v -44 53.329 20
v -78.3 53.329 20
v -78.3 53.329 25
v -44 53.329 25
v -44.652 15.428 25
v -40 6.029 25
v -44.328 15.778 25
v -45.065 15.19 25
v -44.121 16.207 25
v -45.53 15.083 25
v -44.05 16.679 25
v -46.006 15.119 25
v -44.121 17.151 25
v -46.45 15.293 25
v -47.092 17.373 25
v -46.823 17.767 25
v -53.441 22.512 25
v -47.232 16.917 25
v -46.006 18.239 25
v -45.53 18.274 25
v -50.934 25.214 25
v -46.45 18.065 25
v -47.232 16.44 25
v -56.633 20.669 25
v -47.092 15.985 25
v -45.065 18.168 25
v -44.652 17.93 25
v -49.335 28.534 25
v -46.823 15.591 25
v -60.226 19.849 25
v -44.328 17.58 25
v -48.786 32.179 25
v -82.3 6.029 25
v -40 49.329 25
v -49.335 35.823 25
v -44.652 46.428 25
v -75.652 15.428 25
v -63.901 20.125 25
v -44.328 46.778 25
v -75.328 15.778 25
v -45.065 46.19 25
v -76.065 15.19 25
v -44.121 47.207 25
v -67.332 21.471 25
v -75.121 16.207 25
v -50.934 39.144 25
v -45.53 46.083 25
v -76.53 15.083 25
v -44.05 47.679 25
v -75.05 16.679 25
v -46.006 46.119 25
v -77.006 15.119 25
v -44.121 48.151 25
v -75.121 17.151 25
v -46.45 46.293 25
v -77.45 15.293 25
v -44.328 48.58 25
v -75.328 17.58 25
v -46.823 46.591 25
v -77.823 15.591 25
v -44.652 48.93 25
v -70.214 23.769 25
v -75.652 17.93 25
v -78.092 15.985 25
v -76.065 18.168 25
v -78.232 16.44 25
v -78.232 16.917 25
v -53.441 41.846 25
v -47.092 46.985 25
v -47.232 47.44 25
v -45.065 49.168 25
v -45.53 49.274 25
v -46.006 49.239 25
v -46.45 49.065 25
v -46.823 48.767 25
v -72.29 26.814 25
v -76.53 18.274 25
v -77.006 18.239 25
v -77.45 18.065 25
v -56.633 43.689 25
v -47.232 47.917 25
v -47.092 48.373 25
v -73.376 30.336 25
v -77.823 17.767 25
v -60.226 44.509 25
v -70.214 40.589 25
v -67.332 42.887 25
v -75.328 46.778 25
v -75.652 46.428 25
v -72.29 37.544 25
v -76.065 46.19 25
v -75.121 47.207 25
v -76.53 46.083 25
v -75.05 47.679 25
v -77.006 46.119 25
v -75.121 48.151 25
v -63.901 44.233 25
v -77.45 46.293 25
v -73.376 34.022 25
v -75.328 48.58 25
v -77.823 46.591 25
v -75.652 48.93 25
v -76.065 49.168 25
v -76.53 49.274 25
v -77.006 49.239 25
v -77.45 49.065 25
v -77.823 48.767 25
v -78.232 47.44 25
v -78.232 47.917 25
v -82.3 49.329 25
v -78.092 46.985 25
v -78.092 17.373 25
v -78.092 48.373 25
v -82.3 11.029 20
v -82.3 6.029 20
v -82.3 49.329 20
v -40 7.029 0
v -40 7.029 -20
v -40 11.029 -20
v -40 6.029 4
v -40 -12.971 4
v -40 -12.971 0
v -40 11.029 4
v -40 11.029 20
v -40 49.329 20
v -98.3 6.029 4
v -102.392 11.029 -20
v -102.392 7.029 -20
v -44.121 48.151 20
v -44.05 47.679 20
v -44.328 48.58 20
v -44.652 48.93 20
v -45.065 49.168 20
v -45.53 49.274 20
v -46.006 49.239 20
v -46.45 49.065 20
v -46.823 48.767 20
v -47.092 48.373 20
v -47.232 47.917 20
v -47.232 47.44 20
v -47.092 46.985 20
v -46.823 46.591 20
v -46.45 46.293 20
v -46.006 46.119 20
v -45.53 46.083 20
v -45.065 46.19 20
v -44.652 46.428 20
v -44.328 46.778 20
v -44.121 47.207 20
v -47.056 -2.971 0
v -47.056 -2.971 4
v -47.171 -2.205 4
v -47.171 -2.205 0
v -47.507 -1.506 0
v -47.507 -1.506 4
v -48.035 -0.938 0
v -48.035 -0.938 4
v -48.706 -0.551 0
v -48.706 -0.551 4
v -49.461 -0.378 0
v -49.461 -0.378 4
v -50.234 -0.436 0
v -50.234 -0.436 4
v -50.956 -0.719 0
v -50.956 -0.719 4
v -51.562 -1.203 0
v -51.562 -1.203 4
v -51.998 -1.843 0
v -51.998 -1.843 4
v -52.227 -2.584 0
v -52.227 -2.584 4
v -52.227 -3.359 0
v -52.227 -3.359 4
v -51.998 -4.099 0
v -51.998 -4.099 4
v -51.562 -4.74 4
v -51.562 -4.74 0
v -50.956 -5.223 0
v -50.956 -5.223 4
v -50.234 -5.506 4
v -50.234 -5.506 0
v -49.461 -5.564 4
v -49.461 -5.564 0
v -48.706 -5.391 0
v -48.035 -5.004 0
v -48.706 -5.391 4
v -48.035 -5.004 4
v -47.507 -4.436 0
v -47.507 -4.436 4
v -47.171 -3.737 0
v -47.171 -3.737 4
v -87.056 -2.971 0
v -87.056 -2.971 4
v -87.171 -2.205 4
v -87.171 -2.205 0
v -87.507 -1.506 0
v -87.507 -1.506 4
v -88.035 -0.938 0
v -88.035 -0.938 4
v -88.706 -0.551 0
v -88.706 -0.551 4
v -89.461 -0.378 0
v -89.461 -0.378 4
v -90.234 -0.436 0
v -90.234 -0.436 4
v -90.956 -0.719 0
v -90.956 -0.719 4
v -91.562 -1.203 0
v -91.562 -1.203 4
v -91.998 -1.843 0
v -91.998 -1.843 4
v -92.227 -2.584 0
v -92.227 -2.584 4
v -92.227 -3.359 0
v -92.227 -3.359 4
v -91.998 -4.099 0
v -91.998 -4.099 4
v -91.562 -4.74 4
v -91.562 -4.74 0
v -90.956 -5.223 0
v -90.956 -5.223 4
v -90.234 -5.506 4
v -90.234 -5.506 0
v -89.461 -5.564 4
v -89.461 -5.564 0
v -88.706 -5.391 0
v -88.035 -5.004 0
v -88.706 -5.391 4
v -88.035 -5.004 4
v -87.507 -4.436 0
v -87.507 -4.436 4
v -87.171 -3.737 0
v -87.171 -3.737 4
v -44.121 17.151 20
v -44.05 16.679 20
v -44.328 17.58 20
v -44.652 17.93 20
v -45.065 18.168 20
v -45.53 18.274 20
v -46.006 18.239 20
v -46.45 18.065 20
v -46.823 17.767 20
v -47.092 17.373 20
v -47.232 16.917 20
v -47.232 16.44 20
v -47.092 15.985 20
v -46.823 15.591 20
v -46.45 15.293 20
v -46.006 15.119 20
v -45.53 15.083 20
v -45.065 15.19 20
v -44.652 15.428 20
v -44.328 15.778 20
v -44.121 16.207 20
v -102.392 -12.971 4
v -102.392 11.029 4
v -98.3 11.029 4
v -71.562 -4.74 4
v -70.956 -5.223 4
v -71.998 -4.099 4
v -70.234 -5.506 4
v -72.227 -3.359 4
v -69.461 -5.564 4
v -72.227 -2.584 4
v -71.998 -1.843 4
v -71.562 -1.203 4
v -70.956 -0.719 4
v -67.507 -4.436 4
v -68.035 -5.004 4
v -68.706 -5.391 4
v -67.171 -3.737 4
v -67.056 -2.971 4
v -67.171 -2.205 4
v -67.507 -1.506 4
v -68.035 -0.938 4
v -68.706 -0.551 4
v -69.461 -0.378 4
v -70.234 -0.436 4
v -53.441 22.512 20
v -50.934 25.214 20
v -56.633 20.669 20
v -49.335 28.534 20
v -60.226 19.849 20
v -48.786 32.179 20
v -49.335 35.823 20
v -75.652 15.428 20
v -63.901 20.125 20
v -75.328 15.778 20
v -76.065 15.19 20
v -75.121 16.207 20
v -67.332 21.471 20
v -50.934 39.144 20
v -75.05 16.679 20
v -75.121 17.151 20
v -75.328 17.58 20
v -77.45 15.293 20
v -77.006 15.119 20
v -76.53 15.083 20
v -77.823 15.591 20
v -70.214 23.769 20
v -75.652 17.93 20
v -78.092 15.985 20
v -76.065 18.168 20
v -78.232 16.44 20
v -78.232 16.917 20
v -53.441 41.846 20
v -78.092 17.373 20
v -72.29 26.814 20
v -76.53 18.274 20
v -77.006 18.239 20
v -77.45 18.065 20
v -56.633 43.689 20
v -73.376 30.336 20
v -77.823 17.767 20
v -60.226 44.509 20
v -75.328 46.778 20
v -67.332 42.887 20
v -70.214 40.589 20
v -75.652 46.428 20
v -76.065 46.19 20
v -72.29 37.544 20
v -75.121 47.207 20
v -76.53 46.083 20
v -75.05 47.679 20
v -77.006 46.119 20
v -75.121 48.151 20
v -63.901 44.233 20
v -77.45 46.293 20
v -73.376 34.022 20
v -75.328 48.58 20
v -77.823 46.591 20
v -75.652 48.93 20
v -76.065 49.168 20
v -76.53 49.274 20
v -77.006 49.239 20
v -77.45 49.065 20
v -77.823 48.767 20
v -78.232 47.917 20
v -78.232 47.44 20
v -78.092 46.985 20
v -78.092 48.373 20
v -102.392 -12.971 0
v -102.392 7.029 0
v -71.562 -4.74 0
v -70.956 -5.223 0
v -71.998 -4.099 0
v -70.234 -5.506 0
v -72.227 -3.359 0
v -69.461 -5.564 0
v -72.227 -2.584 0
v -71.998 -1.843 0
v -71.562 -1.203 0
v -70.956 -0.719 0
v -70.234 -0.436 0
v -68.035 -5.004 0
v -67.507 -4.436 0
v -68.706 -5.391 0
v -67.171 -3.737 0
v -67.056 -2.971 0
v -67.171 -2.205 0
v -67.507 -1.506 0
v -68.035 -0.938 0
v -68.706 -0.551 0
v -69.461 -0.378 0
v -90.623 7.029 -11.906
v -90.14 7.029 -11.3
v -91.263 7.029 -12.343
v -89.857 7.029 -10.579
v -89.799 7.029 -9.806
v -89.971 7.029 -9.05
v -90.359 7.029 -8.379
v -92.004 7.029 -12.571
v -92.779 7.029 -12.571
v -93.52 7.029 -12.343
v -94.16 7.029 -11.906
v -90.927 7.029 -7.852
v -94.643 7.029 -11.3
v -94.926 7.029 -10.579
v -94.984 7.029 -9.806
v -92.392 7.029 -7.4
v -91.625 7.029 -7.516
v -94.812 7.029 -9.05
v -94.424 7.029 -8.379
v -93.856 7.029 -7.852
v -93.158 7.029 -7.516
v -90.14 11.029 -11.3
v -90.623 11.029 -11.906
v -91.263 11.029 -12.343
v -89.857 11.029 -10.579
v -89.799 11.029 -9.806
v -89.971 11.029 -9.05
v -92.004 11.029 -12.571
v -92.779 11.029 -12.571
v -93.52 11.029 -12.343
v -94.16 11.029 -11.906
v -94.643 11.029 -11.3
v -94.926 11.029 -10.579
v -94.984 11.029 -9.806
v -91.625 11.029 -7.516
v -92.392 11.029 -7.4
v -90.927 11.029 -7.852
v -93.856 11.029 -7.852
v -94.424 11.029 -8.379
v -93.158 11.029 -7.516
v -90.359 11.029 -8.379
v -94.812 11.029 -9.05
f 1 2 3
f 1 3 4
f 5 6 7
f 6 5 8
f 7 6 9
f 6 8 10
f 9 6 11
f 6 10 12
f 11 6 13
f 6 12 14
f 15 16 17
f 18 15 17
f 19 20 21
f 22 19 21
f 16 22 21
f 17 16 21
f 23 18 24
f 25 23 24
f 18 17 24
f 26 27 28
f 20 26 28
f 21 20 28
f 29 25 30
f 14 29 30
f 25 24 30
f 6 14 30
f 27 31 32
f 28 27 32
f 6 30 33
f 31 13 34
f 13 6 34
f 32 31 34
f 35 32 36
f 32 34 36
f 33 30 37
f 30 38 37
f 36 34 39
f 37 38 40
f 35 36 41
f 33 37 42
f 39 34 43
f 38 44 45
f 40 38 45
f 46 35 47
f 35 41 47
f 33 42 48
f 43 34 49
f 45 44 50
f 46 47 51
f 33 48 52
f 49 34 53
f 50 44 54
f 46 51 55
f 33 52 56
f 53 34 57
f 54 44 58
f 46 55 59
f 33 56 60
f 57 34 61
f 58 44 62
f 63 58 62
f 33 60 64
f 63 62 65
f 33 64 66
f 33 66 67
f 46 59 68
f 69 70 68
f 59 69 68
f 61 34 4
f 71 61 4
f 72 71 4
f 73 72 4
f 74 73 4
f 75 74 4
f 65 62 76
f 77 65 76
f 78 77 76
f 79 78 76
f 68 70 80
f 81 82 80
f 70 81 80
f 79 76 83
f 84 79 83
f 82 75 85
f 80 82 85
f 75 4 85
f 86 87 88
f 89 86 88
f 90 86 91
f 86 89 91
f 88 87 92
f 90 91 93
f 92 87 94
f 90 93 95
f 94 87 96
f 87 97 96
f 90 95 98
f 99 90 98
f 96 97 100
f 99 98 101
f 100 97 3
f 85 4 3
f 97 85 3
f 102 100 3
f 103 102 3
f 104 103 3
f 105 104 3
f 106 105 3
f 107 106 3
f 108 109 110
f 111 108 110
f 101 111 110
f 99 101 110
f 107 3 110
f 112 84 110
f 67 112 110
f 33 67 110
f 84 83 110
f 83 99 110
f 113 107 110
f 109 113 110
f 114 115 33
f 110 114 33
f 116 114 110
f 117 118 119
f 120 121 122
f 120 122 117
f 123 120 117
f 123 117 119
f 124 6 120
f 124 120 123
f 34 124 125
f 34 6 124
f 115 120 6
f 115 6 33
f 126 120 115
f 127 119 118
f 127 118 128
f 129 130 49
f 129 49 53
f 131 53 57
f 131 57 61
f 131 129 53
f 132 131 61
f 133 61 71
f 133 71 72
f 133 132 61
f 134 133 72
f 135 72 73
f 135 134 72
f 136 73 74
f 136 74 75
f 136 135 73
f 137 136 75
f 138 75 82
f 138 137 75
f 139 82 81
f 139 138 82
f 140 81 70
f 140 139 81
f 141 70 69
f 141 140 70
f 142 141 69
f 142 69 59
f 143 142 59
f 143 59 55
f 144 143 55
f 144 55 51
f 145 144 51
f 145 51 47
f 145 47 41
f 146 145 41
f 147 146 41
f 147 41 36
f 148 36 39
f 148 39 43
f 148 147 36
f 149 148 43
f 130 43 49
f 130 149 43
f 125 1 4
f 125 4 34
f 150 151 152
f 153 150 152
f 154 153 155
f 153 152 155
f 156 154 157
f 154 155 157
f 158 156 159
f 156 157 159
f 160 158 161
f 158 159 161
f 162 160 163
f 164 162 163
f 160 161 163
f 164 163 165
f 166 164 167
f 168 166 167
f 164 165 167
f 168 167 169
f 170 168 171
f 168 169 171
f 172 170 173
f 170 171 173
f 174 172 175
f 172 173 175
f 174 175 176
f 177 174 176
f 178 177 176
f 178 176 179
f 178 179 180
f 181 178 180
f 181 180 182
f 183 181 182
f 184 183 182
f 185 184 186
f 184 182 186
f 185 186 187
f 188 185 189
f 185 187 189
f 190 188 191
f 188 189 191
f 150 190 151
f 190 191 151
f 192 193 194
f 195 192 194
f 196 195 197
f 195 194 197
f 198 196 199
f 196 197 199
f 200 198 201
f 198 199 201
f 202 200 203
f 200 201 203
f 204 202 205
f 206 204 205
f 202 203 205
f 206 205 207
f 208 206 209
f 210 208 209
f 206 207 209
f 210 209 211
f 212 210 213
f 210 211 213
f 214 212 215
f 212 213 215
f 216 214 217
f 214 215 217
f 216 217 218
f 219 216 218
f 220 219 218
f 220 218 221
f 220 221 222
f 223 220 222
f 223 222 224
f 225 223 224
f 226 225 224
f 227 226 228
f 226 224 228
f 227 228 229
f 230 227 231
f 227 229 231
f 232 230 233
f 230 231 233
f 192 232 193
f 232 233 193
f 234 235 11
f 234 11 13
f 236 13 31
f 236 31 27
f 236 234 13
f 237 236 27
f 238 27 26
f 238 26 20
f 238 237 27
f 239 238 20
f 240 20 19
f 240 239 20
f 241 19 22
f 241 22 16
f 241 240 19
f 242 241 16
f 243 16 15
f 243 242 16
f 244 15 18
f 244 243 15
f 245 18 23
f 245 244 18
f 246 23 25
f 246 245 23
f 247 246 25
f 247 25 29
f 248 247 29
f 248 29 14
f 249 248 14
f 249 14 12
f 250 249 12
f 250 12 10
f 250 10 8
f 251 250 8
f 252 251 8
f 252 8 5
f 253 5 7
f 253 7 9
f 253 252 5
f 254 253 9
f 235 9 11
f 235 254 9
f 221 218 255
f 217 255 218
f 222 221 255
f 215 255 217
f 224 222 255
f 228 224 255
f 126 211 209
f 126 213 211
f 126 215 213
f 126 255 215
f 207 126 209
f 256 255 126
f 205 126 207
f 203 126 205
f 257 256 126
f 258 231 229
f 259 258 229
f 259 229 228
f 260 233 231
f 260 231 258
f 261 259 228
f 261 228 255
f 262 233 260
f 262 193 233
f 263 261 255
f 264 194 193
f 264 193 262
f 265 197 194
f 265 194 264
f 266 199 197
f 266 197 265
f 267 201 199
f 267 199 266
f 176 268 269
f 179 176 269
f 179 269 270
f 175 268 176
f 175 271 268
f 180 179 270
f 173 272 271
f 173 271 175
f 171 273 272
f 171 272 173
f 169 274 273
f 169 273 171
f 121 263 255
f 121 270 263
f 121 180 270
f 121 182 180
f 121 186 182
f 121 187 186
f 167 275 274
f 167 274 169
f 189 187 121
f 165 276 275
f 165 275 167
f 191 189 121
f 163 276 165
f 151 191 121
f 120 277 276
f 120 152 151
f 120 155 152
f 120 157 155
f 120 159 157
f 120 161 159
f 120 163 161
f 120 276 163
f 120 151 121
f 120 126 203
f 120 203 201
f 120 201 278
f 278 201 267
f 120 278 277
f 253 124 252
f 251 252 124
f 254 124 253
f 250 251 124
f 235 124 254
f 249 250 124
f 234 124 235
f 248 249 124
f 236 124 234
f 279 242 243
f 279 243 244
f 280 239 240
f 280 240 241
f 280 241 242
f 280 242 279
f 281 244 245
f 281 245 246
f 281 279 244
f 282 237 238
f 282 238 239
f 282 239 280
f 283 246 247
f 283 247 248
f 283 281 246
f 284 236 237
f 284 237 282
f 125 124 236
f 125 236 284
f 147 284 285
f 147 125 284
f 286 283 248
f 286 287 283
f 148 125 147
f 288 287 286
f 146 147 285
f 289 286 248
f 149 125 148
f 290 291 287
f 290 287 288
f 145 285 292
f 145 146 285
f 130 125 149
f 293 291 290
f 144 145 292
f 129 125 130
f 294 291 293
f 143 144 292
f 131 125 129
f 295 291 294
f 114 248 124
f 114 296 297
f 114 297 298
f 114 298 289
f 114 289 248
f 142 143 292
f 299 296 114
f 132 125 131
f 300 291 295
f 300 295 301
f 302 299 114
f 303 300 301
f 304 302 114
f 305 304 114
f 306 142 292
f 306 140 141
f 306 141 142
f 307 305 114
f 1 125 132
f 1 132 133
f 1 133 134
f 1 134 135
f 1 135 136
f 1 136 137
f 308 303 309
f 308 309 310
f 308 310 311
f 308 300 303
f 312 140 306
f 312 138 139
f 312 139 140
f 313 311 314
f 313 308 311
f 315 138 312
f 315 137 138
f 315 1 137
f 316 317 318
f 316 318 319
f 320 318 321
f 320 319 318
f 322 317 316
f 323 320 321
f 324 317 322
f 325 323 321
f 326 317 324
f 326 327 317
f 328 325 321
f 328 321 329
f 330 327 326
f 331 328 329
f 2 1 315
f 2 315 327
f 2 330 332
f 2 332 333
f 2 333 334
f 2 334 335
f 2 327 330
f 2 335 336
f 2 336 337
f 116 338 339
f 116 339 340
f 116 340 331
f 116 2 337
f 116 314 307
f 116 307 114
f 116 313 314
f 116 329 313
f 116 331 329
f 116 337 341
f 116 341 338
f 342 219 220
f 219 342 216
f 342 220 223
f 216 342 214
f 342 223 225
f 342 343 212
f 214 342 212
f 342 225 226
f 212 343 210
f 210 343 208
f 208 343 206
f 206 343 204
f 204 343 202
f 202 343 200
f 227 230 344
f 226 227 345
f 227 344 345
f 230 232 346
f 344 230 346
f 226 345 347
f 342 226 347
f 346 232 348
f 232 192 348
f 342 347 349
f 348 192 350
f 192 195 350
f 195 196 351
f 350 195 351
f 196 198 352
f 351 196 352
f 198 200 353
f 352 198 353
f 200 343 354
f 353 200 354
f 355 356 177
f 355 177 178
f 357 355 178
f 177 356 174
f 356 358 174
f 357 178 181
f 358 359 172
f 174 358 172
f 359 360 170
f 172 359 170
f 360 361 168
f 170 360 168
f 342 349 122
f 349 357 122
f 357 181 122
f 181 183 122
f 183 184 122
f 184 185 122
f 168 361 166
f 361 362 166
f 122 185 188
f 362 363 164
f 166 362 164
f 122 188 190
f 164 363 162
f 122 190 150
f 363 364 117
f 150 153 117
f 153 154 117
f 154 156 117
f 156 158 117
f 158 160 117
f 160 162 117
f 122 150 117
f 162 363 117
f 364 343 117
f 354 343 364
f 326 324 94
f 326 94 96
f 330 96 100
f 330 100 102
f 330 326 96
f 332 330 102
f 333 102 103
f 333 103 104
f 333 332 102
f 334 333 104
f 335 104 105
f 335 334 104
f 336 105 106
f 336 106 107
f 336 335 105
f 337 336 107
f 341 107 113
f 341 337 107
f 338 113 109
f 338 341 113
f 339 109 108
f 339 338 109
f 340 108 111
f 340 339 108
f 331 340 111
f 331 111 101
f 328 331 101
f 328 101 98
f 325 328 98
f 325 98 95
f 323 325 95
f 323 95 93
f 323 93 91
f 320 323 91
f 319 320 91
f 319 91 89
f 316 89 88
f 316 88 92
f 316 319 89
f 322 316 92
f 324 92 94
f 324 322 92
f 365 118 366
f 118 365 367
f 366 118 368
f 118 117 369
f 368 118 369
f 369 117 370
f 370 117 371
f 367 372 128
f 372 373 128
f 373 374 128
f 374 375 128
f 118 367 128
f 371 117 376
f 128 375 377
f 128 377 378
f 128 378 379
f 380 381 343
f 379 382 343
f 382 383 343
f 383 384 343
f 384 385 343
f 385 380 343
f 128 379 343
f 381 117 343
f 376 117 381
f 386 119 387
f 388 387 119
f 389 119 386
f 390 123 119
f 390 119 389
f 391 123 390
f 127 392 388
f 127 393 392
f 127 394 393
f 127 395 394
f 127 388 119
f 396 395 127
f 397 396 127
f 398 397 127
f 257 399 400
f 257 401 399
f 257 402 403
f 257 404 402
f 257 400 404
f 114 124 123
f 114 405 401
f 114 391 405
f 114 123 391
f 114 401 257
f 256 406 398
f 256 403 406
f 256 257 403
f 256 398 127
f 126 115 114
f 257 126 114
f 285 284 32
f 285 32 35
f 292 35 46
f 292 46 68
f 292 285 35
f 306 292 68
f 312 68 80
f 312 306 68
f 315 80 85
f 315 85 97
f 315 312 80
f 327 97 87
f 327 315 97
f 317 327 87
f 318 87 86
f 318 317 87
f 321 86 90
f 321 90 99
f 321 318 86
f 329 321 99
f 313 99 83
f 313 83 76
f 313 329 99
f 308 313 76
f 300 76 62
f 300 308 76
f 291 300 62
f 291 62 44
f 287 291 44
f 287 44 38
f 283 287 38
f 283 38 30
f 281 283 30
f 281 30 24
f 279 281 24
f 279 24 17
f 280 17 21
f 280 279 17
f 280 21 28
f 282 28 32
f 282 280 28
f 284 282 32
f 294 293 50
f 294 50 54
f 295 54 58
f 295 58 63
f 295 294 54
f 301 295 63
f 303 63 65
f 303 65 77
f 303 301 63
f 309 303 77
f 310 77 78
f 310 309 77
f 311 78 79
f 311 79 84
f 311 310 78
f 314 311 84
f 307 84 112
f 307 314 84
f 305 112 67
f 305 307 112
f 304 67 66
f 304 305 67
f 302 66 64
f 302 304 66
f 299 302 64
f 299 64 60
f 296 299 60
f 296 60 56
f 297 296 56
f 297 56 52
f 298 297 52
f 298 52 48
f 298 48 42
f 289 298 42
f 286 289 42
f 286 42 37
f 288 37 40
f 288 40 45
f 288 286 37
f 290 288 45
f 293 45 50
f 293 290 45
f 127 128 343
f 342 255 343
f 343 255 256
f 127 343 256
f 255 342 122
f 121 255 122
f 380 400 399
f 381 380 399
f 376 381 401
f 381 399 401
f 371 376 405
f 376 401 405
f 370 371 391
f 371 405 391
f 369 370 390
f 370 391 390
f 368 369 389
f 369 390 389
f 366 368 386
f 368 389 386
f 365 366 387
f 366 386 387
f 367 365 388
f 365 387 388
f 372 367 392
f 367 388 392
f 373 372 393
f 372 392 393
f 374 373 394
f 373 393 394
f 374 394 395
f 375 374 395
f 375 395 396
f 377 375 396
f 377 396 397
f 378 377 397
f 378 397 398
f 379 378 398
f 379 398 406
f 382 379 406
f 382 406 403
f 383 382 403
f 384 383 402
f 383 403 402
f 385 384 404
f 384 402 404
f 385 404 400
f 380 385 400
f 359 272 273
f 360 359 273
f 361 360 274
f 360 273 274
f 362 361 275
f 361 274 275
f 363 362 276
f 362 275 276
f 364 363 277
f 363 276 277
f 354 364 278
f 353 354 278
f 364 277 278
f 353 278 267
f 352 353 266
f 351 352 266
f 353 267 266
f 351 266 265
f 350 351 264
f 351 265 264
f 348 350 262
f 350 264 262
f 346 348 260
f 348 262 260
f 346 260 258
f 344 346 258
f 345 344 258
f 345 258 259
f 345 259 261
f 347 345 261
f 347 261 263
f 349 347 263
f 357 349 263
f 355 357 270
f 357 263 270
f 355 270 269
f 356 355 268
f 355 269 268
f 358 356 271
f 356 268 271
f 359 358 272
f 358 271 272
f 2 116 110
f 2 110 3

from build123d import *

# Parameters (mm, degrees)
SKICA1_W                 = 62.391596743
SKICA1_H                 = 24
P_IDAT_VYSUNUT_M1_DEPTH  = 4
SKICA2_W                 = 42.3
SKICA2_H                 = 5
P_IDAT_VYSUNUT_M2_DEPTH  = 16
SKICA3_R                 = 1.6
SKICA3_R_2               = 12.36434098
P_IDAT_VYSUNUT_M5_DEPTH  = 5
ZKOSEN_1_SIZE            = 16
SKICA4_R                 = 2.6
ODEBRAT_VYSUNUT_M1_DEPTH = 4
SKICA5_W                 = 62.391596743
SKICA5_H                 = 4
P_IDAT_VYSUNUT_M6_DEPTH  = 20
SKICA6_R                 = 2.6
ODEBRAT_VYSUNUT_M2_DEPTH = 4


with BuildPart() as part:
    # Skica1 → Přidat vysunutím1 (new body)
    with BuildSketch(Plane.XY):
        with Locations((-71.195798372, -0.971059771)):
            Rectangle(SKICA1_W, SKICA1_H)
    extrude(amount=P_IDAT_VYSUNUT_M1_DEPTH)

    # Skica2 → Přidat vysunutím2 (add)
    with BuildSketch(Plane.XY.offset(4)):
        with Locations((-61.15, 8.528940229)):
            Rectangle(SKICA2_W, SKICA2_H)
    extrude(amount=P_IDAT_VYSUNUT_M2_DEPTH)

    # Skica3 → Přidat vysunutím5 (add)
    with BuildSketch(Plane.XY.offset(20)):
        Polygon((-40, 6.028940229), (-82.3, 6.028940229), (-82.3, 49.328940229), (-78.3, 53.328940229), (-44, 53.328940229), (-40, 49.328940229), align=None)
        with Locations((-45.65, 47.678940229)):
            Circle(SKICA3_R, mode=Mode.SUBTRACT)
        with Locations((-76.65, 47.678940229)):
            Circle(SKICA3_R, mode=Mode.SUBTRACT)
        with Locations((-76.65, 16.678940229)):
            Circle(SKICA3_R, mode=Mode.SUBTRACT)
        with Locations((-45.65, 16.678940229)):
            Circle(SKICA3_R, mode=Mode.SUBTRACT)
        with Locations((-61.15, 32.178940229)):
            Circle(SKICA3_R_2, mode=Mode.SUBTRACT)
    extrude(amount=P_IDAT_VYSUNUT_M5_DEPTH)

    # Zkosení1
    zkosen_1_edges = [part.edges().sort_by_distance(p)[0] for p in [
        (-82.3, 8.528940229, 4),
    ]]
    chamfer(zkosen_1_edges, length=ZKOSEN_1_SIZE)

    # Skica4 → Odebrat vysunutím1 (cut)
    with BuildSketch(Plane.XY.offset(4)):
        with Locations((-89.655606689, -2.971059771)):
            Circle(SKICA4_R)
        with Locations((-69.655606689, -2.971059771)):
            Circle(SKICA4_R)
        with Locations((-49.655606689, -2.971059771)):
            Circle(SKICA4_R)
    extrude(amount=-ODEBRAT_VYSUNUT_M1_DEPTH, mode=Mode.SUBTRACT)

    # Skica5 → Přidat vysunutím6 (add)
    with BuildSketch(Plane(origin=(0, 0, 0), x_dir=(-1, 0, 0), z_dir=(0, 0, -1))):
        with Locations((71.195798372, 9.028940229)):
            Rectangle(SKICA5_W, SKICA5_H)
    extrude(amount=P_IDAT_VYSUNUT_M6_DEPTH)

    # Skica6 → Odebrat vysunutím2 (cut)
    with BuildSketch(Plane(origin=(0, 11.028940229, 0), x_dir=(1, 0, 0), z_dir=(0, 1, 0))):
        with Locations(Location((-92.391596743, 10, 0), (0, 0, 270))):
            Circle(SKICA6_R)
    extrude(amount=-ODEBRAT_VYSUNUT_M2_DEPTH, mode=Mode.SUBTRACT)


solid = part.part
